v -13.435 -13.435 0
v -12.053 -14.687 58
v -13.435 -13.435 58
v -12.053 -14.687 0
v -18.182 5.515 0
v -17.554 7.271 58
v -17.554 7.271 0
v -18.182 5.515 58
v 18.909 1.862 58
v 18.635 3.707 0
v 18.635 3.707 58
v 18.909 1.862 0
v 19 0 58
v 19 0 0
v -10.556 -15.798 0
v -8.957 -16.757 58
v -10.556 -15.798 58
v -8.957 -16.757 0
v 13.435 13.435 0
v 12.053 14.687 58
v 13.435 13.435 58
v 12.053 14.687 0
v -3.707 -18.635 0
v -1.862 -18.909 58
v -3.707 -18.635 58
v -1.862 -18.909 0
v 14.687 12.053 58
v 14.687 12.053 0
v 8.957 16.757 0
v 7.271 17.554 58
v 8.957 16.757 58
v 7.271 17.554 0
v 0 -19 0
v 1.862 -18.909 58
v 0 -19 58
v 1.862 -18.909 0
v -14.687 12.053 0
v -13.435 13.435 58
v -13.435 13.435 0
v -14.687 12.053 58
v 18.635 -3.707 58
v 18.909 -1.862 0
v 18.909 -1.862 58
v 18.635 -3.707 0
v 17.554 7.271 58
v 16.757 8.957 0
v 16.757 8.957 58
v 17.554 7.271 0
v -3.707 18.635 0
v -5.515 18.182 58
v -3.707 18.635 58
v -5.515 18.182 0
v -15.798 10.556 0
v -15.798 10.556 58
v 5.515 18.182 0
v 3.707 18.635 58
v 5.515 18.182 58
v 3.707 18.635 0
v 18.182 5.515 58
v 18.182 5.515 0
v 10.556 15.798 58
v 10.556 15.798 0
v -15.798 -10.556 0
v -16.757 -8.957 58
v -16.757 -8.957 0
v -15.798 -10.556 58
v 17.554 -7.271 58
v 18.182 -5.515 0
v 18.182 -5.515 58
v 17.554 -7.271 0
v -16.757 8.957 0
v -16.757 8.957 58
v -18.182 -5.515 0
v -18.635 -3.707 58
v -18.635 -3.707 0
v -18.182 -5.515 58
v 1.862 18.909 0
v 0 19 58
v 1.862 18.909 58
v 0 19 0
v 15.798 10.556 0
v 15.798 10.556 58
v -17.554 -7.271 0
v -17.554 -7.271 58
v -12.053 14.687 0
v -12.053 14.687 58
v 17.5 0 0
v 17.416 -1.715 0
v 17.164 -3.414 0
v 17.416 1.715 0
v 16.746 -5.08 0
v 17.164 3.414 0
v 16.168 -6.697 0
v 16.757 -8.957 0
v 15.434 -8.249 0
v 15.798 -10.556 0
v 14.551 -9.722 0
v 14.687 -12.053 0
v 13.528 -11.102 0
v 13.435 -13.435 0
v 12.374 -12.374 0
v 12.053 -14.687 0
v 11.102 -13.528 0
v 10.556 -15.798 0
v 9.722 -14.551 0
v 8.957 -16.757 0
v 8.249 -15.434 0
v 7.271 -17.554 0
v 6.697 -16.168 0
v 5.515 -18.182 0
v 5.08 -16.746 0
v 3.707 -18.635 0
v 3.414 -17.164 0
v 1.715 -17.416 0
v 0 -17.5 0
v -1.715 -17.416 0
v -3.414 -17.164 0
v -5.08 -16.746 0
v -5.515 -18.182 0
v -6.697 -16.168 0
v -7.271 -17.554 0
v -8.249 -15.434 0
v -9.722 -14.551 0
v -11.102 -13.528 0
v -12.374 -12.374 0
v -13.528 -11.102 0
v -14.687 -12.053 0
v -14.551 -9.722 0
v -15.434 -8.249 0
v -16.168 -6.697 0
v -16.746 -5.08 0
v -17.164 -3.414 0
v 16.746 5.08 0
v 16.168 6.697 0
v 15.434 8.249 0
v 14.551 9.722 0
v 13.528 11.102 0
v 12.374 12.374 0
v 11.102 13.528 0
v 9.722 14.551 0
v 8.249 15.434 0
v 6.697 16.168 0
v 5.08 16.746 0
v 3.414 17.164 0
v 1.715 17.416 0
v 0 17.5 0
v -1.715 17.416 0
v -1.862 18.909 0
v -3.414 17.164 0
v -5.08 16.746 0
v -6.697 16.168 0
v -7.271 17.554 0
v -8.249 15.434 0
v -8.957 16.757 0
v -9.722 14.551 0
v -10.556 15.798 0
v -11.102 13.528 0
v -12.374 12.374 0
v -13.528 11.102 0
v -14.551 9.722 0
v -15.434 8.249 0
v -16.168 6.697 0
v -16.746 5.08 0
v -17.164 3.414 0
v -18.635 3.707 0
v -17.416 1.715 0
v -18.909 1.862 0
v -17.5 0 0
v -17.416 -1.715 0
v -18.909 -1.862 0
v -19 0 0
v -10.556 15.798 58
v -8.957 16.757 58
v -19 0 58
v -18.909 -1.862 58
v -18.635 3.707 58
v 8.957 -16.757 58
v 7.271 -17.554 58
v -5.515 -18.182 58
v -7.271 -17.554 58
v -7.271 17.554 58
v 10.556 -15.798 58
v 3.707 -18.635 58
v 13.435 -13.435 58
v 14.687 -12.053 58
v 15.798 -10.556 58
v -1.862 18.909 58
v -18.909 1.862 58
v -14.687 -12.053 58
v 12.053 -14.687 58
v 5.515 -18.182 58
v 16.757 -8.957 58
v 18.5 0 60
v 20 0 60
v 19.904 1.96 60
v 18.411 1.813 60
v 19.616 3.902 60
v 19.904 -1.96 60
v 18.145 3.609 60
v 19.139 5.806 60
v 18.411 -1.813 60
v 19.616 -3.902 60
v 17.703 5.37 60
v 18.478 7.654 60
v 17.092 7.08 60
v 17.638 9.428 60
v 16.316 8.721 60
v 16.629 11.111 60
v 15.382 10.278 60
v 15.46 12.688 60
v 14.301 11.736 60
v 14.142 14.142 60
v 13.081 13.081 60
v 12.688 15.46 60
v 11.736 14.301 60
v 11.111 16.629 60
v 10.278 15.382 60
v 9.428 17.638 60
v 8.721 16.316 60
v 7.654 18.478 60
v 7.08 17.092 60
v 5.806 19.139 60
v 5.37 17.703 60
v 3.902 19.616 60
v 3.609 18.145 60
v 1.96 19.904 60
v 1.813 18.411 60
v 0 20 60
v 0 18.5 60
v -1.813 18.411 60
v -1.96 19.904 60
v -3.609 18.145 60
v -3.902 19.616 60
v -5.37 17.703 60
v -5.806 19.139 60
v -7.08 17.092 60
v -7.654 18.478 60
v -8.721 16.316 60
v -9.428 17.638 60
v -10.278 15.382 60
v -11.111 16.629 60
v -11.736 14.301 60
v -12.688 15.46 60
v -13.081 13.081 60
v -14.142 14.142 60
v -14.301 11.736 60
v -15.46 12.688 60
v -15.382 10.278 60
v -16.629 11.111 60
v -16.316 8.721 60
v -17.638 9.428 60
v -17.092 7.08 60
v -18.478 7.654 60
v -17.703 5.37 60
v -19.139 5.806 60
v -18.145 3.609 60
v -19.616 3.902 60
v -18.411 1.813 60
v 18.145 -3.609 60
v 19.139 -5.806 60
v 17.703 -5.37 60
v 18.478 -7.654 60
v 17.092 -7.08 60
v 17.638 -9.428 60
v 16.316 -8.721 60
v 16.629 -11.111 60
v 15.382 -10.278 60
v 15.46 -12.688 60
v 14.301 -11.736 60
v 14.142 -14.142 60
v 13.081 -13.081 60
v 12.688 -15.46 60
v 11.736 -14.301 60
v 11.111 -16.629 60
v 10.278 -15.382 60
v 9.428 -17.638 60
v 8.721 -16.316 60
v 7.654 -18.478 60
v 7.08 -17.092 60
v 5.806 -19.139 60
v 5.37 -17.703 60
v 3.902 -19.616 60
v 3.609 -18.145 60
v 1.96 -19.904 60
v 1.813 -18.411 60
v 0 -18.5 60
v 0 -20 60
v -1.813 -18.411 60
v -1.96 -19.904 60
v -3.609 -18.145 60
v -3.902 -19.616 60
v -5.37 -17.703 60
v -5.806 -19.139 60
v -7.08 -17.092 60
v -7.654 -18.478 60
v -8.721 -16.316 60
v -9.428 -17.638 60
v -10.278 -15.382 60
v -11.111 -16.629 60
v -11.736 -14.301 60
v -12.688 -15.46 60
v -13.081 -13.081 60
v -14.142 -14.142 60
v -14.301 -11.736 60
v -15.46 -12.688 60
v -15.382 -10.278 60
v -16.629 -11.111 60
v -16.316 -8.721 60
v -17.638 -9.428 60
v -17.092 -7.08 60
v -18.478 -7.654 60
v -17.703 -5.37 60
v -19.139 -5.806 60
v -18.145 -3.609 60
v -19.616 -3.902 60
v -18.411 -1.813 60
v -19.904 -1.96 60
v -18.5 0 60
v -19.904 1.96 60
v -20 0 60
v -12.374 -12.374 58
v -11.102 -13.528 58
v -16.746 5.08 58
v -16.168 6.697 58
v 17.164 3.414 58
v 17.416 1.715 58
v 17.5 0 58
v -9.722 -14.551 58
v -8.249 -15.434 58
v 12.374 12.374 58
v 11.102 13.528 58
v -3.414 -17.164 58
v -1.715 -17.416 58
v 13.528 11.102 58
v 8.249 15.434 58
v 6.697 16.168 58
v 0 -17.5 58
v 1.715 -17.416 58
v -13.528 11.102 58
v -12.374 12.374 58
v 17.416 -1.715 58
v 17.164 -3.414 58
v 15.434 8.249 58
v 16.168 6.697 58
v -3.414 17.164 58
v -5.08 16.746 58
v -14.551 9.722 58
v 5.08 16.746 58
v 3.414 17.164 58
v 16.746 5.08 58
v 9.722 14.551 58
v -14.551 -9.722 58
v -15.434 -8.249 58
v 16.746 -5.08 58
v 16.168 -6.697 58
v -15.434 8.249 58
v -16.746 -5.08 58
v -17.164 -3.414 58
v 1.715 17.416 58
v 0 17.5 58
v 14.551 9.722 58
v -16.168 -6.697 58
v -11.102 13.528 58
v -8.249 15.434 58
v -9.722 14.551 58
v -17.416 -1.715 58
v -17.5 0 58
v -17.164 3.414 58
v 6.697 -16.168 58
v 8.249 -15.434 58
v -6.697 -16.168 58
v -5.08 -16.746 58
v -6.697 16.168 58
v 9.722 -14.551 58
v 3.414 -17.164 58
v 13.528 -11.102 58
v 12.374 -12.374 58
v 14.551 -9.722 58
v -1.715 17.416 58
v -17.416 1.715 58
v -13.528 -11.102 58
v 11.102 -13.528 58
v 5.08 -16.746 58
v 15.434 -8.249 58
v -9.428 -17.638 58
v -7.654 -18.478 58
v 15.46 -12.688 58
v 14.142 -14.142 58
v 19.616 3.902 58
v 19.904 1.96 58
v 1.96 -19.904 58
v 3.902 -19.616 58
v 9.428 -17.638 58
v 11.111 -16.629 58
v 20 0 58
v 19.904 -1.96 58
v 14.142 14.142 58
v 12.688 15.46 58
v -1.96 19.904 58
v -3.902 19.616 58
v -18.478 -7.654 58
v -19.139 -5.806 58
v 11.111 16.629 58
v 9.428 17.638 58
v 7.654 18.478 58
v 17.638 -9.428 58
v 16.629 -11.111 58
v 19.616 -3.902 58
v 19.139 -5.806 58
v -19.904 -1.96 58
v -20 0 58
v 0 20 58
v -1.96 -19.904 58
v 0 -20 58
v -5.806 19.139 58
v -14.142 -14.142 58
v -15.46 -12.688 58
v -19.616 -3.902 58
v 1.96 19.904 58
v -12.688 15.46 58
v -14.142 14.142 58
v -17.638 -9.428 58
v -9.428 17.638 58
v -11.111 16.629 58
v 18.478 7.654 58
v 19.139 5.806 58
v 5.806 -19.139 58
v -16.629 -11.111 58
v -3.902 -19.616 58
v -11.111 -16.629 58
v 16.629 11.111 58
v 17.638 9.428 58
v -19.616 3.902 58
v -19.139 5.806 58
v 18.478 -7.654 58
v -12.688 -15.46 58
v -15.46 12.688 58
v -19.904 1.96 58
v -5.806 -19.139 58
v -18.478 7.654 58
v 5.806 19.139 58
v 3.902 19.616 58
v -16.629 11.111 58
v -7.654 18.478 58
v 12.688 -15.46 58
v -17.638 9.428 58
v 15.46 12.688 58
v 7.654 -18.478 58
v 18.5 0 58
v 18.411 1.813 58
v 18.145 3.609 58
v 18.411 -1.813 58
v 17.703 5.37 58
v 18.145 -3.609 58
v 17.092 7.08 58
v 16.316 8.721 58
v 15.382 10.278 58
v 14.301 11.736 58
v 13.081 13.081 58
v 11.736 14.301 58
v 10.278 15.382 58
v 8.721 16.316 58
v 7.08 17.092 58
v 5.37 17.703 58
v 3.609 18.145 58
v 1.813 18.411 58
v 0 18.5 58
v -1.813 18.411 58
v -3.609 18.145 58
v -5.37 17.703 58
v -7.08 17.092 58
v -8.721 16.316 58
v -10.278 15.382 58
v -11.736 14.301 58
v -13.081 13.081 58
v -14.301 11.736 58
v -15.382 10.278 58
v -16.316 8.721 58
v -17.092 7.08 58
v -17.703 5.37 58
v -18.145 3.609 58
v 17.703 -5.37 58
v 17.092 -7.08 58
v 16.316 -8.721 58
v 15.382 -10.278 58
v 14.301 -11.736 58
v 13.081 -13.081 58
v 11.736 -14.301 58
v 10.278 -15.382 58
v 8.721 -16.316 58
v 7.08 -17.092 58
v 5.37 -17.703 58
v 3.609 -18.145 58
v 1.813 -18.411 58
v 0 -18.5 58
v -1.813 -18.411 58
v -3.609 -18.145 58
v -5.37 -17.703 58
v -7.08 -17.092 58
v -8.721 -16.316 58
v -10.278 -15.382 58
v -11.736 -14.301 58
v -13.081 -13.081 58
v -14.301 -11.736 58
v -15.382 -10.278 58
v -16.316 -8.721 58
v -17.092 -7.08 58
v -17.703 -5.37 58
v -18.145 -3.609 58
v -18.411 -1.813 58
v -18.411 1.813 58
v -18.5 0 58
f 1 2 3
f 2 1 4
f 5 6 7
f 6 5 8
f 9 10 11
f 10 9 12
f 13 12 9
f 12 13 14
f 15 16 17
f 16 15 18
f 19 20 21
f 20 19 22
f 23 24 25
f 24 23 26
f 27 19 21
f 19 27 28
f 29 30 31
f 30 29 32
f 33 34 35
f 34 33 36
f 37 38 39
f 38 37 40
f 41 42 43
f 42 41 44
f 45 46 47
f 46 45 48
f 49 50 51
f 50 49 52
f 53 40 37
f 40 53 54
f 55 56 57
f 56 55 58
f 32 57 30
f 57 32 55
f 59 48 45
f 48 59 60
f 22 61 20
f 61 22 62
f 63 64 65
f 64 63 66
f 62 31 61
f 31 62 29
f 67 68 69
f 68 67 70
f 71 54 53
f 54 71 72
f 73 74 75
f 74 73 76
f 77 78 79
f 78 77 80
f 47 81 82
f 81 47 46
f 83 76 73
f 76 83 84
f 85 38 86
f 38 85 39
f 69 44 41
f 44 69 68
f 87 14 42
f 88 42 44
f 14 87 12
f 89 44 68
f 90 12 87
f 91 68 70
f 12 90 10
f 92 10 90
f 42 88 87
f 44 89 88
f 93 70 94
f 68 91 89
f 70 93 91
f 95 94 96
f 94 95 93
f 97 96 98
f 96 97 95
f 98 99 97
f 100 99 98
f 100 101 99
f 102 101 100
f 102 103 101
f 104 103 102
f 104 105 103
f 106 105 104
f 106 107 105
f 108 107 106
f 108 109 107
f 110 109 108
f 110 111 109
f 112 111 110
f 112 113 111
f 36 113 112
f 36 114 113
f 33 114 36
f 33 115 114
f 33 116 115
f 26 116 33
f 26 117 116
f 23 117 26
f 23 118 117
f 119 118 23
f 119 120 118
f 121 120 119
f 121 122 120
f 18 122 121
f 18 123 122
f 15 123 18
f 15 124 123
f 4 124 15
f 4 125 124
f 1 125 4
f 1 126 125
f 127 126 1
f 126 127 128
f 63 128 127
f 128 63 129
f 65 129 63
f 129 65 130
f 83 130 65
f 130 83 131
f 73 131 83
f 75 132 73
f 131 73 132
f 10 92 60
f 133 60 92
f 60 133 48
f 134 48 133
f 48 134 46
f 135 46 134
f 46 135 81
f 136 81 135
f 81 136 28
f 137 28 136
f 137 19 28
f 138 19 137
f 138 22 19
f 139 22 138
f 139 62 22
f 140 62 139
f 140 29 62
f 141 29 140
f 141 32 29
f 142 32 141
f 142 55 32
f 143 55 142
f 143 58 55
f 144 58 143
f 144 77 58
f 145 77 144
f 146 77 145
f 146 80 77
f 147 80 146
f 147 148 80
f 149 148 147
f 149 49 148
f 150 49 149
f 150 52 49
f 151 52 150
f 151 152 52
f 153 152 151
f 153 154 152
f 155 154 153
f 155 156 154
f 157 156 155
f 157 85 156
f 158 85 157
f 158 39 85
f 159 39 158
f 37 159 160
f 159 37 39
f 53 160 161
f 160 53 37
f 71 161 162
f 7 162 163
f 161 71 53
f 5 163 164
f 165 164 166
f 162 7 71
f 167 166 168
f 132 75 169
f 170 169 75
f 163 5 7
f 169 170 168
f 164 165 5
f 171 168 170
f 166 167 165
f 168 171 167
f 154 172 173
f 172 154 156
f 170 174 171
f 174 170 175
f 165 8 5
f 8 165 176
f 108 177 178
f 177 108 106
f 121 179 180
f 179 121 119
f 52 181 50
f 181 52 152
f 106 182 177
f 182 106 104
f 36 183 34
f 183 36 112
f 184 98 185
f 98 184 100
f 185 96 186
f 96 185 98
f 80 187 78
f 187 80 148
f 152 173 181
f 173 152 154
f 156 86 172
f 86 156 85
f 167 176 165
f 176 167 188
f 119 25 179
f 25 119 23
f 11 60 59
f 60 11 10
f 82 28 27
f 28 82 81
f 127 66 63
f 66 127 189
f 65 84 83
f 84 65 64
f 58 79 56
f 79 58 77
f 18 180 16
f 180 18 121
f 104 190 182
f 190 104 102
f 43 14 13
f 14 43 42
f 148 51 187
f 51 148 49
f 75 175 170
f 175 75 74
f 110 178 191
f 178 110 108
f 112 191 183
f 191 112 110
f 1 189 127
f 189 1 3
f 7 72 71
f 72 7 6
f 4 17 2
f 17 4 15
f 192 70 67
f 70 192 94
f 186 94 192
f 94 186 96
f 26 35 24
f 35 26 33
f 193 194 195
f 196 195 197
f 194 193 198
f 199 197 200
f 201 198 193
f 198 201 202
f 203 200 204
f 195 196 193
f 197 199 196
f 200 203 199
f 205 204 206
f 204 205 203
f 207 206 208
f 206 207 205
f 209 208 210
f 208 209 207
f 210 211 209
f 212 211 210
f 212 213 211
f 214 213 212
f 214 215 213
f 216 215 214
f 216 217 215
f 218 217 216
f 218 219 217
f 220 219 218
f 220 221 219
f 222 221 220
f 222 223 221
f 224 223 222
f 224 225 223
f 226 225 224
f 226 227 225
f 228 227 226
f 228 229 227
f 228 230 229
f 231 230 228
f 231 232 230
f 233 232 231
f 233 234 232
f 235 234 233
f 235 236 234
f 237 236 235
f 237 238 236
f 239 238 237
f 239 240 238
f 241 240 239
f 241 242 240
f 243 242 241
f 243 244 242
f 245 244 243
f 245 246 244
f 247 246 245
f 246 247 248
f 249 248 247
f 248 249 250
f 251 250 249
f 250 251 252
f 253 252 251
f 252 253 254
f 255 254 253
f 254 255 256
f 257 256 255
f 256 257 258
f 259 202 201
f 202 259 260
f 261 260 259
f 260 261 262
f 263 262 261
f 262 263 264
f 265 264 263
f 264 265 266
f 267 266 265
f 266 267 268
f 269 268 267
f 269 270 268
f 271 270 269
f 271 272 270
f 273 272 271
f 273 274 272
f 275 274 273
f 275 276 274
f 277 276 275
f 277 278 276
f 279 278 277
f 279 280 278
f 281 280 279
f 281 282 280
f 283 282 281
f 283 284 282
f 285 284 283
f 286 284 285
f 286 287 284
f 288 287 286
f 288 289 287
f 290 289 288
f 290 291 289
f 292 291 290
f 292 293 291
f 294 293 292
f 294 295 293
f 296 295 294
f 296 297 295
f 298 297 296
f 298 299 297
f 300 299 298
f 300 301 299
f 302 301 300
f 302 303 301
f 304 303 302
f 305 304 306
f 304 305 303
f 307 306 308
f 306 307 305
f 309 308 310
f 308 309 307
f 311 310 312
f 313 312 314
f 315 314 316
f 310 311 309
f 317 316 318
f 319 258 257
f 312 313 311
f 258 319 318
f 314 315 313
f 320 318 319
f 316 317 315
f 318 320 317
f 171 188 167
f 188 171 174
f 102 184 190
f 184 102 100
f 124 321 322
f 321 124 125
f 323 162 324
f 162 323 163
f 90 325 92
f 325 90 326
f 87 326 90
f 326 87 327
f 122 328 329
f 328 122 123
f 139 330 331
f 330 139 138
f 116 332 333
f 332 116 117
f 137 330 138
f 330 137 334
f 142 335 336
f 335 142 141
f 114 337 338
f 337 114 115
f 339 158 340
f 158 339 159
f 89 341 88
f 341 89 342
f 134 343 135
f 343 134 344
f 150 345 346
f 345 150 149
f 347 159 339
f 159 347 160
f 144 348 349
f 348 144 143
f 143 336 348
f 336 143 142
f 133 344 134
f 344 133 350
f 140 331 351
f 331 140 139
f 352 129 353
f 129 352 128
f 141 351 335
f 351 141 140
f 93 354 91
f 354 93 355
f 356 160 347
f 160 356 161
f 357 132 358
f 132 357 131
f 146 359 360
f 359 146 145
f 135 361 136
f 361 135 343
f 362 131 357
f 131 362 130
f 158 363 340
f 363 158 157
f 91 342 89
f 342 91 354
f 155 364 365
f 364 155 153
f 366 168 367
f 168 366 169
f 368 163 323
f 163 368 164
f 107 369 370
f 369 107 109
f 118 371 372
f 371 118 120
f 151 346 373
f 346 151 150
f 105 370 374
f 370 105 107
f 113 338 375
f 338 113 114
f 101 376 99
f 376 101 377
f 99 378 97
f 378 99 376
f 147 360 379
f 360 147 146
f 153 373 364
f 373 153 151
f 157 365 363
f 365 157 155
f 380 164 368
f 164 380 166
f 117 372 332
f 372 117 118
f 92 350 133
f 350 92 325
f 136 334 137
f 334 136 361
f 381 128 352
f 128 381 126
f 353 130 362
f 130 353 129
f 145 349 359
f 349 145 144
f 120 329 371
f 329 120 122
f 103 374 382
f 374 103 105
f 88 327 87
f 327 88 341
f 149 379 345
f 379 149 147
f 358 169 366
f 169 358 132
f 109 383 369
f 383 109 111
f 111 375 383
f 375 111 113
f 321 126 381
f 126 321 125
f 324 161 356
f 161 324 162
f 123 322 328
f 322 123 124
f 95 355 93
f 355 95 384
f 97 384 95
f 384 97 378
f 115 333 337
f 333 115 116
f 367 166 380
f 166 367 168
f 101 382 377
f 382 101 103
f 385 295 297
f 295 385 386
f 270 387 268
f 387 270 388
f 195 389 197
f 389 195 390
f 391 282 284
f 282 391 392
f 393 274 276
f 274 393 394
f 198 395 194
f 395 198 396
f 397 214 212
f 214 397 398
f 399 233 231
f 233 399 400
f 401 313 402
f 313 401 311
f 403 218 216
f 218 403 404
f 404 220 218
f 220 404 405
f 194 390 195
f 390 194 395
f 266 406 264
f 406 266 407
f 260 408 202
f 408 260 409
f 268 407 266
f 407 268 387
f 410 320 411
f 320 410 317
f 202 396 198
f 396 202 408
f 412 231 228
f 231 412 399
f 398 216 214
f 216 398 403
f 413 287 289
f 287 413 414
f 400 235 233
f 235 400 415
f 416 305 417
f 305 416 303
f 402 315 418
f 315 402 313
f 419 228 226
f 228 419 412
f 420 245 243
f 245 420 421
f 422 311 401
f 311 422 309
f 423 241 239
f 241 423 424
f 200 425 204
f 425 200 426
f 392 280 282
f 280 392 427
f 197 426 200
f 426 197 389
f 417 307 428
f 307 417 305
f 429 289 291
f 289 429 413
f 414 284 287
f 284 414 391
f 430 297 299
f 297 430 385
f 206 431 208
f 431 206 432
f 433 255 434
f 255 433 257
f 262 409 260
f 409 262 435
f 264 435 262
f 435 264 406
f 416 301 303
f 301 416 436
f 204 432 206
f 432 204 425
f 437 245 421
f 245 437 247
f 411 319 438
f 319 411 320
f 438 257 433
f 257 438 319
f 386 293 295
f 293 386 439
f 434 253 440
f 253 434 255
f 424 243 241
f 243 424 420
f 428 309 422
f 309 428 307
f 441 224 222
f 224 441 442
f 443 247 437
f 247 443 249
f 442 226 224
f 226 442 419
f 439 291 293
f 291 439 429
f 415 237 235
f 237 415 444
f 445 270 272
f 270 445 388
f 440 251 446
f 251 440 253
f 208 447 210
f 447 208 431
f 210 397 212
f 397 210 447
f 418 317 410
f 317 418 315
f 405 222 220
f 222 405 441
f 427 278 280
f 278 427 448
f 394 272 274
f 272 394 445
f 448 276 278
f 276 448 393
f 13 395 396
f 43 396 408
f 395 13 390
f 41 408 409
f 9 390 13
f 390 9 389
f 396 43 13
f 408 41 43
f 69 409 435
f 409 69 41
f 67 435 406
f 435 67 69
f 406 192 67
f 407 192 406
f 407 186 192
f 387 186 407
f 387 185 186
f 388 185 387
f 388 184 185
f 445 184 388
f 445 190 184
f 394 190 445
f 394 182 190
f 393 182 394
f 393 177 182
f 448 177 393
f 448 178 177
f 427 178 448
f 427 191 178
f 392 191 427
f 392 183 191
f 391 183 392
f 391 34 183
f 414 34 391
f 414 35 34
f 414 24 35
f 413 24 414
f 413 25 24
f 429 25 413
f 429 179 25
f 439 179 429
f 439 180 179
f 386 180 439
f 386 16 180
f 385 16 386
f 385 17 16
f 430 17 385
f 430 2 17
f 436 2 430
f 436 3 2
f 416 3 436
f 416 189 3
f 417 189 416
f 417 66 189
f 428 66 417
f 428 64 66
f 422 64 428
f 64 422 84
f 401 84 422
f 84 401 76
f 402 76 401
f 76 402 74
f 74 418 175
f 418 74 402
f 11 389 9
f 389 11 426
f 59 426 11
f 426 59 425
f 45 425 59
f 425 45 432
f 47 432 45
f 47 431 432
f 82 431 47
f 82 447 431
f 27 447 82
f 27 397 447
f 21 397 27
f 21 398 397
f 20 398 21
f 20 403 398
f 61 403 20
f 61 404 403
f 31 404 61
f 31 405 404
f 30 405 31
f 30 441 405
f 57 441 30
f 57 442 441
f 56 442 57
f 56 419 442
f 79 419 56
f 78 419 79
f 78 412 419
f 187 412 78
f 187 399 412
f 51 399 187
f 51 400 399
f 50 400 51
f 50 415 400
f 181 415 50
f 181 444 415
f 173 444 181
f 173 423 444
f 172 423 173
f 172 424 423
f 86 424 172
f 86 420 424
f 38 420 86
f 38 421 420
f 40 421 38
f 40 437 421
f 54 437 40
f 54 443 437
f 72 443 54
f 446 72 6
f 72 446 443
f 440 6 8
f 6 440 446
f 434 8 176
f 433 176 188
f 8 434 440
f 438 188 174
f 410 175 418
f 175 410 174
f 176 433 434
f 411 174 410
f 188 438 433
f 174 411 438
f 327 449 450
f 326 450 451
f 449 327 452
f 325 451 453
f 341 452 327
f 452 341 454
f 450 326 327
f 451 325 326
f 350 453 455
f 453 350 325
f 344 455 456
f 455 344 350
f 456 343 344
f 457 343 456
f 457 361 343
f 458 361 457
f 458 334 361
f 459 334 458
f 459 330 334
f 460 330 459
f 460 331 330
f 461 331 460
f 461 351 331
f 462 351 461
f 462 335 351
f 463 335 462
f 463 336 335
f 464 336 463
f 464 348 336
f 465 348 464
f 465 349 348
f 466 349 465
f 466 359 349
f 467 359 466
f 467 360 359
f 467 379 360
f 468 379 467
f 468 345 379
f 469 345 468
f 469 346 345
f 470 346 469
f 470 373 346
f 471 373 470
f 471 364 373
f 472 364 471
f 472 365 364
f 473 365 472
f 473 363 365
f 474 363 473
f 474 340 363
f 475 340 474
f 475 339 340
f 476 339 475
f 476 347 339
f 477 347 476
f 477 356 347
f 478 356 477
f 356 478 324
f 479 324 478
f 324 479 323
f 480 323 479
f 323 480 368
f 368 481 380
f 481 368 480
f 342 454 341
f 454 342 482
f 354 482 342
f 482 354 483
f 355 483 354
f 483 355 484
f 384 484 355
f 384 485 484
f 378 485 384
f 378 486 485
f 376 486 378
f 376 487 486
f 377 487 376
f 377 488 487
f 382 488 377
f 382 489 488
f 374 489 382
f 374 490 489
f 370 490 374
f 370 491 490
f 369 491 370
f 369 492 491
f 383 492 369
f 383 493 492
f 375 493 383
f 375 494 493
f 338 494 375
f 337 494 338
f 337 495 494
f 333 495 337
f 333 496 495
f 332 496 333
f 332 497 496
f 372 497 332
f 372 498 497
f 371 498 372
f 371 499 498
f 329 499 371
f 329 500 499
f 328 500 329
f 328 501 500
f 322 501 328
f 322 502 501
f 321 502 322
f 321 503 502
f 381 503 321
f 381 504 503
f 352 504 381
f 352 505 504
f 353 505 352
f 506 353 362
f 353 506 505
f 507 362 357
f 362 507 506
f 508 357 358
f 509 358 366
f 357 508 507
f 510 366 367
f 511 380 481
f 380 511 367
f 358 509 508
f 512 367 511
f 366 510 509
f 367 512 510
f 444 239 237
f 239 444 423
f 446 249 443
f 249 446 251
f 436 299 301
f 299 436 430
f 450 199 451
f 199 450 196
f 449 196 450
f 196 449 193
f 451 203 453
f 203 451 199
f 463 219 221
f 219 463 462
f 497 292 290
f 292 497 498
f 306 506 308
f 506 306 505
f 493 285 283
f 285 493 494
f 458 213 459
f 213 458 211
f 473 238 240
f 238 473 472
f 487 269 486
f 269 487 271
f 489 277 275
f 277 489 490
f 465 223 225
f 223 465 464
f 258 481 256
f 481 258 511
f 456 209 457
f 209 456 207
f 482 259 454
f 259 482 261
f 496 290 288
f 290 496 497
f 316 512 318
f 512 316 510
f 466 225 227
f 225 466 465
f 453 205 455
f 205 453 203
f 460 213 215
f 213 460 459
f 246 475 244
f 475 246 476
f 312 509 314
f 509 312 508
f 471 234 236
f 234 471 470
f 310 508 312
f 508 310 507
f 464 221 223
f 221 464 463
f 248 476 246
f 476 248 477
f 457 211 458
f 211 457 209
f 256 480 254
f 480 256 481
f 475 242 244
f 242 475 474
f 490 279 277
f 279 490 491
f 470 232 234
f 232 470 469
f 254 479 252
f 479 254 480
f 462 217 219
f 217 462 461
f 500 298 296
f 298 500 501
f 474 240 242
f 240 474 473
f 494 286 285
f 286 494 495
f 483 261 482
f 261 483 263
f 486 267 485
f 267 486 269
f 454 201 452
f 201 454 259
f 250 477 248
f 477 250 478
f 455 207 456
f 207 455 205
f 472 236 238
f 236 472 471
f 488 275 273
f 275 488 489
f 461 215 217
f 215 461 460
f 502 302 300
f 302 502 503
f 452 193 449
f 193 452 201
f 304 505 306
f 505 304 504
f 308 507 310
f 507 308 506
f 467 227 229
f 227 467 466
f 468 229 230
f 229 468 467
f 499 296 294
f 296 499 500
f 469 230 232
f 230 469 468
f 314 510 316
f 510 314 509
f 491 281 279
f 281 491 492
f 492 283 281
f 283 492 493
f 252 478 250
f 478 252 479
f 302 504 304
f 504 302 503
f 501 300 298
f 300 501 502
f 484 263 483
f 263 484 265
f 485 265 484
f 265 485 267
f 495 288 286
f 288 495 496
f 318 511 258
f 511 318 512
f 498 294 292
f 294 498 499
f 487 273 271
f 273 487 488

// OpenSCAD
$fn = 64;
difference() {
	union() {
		difference() {
			cylinder(h = 60, r = 19.0);
			translate(v = [0, 0, -0.05]) {
				cylinder(h = 60.1, r = 17.5);
			}
		}
		translate(v = [0, 0, 58]) {
			cylinder(h = 2, r = 20.0);
		}
	}
	translate(v = [0, 0, 58]) {
		cylinder(h = 2.1, r = 18.5);
	}
}
